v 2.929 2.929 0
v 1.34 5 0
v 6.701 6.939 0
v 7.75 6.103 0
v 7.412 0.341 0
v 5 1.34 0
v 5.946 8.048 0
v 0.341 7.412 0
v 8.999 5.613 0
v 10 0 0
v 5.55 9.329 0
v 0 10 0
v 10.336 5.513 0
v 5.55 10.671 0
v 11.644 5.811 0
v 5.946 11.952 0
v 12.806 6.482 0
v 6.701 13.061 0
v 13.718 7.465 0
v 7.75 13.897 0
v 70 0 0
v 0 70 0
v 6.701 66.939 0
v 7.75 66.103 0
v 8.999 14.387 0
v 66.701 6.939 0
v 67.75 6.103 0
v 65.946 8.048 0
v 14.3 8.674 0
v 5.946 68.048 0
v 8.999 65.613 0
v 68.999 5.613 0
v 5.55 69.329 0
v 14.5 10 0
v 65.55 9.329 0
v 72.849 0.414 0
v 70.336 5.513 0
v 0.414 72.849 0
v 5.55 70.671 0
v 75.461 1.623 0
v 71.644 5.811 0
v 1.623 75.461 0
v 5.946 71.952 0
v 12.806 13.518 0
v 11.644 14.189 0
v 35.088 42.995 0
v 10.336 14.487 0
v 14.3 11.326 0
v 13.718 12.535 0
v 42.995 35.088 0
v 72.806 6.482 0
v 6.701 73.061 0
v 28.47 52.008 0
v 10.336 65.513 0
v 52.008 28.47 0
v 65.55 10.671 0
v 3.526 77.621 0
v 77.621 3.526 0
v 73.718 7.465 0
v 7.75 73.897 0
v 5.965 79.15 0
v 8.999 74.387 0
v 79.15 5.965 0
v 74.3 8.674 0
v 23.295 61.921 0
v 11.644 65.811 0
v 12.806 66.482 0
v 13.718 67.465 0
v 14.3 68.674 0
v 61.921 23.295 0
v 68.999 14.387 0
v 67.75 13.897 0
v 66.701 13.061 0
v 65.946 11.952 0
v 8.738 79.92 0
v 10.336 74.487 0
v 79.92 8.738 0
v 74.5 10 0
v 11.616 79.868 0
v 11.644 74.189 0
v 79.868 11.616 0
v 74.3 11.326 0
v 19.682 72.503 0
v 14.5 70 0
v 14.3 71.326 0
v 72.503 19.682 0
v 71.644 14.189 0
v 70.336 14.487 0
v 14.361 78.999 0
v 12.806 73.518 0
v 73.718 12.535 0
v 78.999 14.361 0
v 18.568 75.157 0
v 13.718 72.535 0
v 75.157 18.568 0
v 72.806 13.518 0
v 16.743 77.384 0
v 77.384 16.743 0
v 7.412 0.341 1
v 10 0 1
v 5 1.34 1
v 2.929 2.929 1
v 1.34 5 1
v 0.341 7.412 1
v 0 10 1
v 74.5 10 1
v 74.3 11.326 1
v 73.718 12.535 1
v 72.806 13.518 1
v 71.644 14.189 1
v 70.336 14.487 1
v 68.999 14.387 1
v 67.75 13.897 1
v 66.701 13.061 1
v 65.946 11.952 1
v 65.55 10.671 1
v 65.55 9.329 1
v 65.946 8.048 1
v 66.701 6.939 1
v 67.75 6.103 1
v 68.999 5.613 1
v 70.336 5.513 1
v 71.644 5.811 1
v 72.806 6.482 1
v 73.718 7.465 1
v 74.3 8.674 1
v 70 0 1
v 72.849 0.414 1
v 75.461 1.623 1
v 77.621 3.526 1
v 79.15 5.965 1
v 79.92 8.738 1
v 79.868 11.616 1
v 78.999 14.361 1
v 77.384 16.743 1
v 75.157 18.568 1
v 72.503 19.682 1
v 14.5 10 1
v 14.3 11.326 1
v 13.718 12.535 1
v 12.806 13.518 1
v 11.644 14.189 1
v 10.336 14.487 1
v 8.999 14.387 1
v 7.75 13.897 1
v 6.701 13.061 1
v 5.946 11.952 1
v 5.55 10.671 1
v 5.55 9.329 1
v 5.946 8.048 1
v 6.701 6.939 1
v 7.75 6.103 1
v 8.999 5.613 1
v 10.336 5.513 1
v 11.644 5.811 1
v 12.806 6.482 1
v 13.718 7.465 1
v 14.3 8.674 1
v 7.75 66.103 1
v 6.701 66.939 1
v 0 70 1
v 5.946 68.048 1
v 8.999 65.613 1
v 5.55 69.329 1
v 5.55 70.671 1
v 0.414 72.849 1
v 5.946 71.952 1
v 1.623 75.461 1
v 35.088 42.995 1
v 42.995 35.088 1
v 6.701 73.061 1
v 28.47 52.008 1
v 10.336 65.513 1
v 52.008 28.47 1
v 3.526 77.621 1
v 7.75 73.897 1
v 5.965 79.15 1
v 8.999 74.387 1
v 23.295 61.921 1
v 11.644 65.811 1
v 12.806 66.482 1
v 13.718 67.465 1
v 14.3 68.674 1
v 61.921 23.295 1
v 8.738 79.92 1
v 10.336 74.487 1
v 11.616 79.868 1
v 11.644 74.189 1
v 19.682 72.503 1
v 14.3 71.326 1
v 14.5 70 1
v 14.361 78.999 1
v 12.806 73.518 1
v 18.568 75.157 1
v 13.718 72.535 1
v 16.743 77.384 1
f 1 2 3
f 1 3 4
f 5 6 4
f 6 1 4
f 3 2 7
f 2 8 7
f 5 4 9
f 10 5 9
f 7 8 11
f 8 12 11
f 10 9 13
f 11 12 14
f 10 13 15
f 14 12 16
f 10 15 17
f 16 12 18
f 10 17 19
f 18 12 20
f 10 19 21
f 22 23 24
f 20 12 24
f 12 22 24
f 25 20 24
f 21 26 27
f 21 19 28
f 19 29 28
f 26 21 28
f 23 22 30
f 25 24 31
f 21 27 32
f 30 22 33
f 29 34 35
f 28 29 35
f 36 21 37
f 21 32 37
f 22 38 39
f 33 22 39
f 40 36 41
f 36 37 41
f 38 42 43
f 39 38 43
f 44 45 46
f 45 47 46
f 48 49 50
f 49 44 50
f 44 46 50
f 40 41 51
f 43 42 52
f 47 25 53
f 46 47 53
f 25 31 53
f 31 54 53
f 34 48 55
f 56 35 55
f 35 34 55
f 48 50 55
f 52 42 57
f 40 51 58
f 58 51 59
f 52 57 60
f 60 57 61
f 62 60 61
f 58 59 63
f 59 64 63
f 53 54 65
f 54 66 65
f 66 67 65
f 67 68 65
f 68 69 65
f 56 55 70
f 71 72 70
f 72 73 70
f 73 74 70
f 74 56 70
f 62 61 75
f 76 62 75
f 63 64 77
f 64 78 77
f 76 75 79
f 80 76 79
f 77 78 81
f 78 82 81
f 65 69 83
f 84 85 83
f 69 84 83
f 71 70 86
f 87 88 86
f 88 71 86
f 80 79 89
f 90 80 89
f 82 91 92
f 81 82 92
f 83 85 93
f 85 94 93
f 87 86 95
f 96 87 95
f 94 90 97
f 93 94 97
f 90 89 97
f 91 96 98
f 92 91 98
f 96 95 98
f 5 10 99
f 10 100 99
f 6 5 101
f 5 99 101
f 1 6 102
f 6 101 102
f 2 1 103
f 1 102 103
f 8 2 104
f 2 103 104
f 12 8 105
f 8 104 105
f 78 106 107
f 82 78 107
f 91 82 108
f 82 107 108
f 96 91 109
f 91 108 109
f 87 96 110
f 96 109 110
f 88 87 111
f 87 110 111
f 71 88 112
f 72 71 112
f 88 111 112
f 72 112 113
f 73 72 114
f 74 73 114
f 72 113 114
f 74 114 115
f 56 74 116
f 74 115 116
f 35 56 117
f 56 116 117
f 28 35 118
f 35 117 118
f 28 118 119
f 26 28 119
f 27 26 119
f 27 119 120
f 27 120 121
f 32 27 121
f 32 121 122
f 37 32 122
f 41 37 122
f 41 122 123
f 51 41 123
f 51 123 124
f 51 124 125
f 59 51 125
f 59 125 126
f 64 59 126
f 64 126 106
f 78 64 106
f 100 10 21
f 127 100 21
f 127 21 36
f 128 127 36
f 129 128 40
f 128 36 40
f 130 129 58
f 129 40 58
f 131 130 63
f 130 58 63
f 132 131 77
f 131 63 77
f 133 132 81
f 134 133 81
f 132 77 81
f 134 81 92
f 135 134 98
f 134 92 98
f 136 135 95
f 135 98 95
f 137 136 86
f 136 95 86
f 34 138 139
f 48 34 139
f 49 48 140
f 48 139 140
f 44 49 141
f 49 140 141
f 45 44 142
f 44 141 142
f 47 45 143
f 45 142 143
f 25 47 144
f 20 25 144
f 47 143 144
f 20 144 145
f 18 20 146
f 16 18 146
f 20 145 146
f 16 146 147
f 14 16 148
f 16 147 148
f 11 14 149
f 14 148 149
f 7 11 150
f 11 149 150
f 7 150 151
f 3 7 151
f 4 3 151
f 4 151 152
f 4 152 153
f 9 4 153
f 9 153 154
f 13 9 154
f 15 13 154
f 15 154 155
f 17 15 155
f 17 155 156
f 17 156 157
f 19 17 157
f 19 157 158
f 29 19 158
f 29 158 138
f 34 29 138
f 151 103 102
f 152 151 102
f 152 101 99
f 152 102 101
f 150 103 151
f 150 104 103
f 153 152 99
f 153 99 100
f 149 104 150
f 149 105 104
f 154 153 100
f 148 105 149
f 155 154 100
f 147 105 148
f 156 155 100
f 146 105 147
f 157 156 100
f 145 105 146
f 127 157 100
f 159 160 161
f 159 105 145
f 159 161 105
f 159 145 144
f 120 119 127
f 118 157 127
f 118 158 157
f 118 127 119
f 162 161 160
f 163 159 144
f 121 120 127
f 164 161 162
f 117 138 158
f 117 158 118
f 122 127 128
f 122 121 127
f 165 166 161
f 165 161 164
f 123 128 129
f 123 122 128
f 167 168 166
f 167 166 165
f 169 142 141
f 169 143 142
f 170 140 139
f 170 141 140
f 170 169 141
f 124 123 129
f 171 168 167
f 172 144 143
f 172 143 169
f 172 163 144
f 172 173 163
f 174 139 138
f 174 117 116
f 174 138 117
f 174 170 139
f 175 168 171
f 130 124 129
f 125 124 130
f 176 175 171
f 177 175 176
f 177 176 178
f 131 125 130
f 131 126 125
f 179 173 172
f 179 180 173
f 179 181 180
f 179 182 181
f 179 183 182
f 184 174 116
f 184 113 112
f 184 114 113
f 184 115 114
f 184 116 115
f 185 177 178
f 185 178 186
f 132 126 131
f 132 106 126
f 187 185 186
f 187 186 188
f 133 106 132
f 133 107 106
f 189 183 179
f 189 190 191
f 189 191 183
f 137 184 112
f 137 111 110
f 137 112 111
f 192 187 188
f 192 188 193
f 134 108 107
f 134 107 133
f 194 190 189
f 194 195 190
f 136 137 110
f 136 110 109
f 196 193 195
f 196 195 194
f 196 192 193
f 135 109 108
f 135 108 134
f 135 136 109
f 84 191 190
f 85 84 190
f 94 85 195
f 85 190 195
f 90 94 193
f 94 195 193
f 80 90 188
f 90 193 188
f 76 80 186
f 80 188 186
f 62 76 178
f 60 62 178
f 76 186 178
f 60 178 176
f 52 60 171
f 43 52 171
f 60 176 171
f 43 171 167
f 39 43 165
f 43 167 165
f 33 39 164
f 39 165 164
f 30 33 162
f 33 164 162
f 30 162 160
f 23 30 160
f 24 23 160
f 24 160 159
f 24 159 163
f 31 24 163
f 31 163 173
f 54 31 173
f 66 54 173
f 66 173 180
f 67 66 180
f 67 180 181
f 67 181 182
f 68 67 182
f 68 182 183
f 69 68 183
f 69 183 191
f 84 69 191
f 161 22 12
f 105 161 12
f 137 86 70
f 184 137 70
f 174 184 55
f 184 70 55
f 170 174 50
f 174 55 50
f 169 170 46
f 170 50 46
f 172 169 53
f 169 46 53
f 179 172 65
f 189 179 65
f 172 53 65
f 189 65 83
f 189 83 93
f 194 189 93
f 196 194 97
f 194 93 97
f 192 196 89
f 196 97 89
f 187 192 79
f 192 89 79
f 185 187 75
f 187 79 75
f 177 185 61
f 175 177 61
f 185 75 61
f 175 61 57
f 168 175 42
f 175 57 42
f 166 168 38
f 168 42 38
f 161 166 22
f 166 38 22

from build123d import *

# Parameters (mm, degrees)
BOSS_EXTRUDE1_DEPTH = 1
FILLET1_R           = 10
SKETCH2_R           = 4.5
CUT_EXTRUDE1_DEPTH  = 10


with BuildPart() as part:
    # Sketch1 → Boss-Extrude1 (new body)
    with BuildSketch(Plane.XY):
        with BuildLine():
            Line((0, 0), (70, 0))
            ThreePointArc((70, 0), (79.920098672, 8.738396919), (72.50304541, 19.681671533))
            ThreePointArc((72.50304541, 19.681671533), (38.890872965, 38.890872965), (19.681671533, 72.50304541))
            ThreePointArc((19.681671533, 72.50304541), (8.738396919, 79.920098672), (0, 70))
            Line((0, 70), (0, 0))
        make_face()
    extrude(amount=BOSS_EXTRUDE1_DEPTH)

    # Fillet1
    fillet1_edges = [part.edges().sort_by_distance(p)[0] for p in [
        (0, 0, 0.5),
    ]]
    fillet(fillet1_edges, radius=FILLET1_R)

    # Sketch2 → Cut-Extrude1 (cut)
    with BuildSketch(Plane.XY.offset(1)):
        with Locations((10, 10)):
            Circle(SKETCH2_R)
        with Locations((70, 10)):
            Circle(SKETCH2_R)
        with Locations((10, 70)):
            Circle(SKETCH2_R)
    extrude(amount=-CUT_EXTRUDE1_DEPTH, mode=Mode.SUBTRACT)


solid = part.part
